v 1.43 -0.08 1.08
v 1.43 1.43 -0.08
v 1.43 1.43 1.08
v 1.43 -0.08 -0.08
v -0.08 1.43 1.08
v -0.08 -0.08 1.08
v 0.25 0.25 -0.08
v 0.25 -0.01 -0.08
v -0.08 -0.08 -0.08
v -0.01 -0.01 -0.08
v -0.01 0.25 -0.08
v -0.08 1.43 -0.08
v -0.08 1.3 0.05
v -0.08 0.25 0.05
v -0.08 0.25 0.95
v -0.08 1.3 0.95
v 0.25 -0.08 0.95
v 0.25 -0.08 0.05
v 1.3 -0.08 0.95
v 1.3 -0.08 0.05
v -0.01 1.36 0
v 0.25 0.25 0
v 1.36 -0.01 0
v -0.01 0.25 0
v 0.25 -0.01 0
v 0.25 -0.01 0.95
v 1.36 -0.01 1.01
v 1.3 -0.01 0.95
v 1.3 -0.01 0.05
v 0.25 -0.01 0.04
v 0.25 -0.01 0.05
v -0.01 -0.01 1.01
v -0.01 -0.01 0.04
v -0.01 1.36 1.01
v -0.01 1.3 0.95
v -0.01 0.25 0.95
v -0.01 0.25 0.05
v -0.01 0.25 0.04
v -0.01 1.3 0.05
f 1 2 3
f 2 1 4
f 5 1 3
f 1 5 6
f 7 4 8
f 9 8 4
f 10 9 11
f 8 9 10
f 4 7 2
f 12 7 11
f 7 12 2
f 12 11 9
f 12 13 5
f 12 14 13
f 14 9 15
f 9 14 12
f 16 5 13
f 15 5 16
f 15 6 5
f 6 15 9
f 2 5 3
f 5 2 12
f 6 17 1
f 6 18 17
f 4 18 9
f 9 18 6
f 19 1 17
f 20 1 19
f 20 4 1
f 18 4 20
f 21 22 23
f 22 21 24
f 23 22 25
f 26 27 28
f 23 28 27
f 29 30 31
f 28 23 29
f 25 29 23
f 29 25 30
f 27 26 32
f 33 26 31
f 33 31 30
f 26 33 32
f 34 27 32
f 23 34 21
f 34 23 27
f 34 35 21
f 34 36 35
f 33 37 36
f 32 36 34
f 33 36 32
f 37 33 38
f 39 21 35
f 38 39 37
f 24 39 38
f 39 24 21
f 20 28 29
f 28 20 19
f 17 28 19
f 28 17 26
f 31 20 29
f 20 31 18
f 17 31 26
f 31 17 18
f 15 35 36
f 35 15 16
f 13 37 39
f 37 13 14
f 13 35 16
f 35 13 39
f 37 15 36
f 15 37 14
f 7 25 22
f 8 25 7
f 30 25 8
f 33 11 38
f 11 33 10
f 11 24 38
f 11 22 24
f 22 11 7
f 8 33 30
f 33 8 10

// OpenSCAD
// FireWatch Industrial Tooling - Streamlined Tape Application Alignment Jig
// Explicitly scaled to mask and hold the 1.35" x 1.35" Calibrated Chassis
$fn = 64; 

// Form factor offsets to nest cleanly over the downscaled single-chamber module
block_width    = 1.35; // Inches
block_height   = 1.35; 
block_length   = 1.00; // Profile height for tool stabilization
wall           = 0.08; // 2mm ruggedized perimeter masking wall
tolerance      = 0.01; // Mechanical slip clearance margin

module streamlined_alignment_jig() {
    difference() {
        // 1. Primary Exterior Tooling Frame Block
        translate([-wall, -wall, -wall])
            cube([block_width + (wall * 2), block_height + (wall * 2), block_length + (wall * 2)]);
        
        // 2. Center Nosing Pocket (Nests the Standard Fire Red capsule launcher snugly)
        linear_extrude(height = block_length + tolerance) {
            polygon(points=[[-tolerance, -tolerance], 
                            [block_width + tolerance, -tolerance], 
                            [-tolerance, block_height + tolerance]]);
        }
        
        // 3. Bottom Plane Tape Application Slot
        // Exposes exact boundary tracks for the pre-cut natural tree-rubber tape
        translate([0.25, -wall - 0.02, 0.05])
            cube([block_width - 0.3, wall + 0.05, block_length - 0.1]);
            
        // 4. Back Plane Tape Application Slot
        translate([-wall - 0.02, 0.25, 0.05])
            cube([wall + 0.05, block_height - 0.3, block_length - 0.1]);
            
        // 5. High-Impact Internal Mask Shields
        // Protects the 0.222" micro-bore barrel paths from adhesive or residue transfer
        translate([-tolerance, -tolerance, -wall - 0.01])
            cube([0.25 + tolerance, 0.25 + tolerance, wall + 0.05]);
    }
}

// Instantiate the production tool layer
streamlined_alignment_jig();
